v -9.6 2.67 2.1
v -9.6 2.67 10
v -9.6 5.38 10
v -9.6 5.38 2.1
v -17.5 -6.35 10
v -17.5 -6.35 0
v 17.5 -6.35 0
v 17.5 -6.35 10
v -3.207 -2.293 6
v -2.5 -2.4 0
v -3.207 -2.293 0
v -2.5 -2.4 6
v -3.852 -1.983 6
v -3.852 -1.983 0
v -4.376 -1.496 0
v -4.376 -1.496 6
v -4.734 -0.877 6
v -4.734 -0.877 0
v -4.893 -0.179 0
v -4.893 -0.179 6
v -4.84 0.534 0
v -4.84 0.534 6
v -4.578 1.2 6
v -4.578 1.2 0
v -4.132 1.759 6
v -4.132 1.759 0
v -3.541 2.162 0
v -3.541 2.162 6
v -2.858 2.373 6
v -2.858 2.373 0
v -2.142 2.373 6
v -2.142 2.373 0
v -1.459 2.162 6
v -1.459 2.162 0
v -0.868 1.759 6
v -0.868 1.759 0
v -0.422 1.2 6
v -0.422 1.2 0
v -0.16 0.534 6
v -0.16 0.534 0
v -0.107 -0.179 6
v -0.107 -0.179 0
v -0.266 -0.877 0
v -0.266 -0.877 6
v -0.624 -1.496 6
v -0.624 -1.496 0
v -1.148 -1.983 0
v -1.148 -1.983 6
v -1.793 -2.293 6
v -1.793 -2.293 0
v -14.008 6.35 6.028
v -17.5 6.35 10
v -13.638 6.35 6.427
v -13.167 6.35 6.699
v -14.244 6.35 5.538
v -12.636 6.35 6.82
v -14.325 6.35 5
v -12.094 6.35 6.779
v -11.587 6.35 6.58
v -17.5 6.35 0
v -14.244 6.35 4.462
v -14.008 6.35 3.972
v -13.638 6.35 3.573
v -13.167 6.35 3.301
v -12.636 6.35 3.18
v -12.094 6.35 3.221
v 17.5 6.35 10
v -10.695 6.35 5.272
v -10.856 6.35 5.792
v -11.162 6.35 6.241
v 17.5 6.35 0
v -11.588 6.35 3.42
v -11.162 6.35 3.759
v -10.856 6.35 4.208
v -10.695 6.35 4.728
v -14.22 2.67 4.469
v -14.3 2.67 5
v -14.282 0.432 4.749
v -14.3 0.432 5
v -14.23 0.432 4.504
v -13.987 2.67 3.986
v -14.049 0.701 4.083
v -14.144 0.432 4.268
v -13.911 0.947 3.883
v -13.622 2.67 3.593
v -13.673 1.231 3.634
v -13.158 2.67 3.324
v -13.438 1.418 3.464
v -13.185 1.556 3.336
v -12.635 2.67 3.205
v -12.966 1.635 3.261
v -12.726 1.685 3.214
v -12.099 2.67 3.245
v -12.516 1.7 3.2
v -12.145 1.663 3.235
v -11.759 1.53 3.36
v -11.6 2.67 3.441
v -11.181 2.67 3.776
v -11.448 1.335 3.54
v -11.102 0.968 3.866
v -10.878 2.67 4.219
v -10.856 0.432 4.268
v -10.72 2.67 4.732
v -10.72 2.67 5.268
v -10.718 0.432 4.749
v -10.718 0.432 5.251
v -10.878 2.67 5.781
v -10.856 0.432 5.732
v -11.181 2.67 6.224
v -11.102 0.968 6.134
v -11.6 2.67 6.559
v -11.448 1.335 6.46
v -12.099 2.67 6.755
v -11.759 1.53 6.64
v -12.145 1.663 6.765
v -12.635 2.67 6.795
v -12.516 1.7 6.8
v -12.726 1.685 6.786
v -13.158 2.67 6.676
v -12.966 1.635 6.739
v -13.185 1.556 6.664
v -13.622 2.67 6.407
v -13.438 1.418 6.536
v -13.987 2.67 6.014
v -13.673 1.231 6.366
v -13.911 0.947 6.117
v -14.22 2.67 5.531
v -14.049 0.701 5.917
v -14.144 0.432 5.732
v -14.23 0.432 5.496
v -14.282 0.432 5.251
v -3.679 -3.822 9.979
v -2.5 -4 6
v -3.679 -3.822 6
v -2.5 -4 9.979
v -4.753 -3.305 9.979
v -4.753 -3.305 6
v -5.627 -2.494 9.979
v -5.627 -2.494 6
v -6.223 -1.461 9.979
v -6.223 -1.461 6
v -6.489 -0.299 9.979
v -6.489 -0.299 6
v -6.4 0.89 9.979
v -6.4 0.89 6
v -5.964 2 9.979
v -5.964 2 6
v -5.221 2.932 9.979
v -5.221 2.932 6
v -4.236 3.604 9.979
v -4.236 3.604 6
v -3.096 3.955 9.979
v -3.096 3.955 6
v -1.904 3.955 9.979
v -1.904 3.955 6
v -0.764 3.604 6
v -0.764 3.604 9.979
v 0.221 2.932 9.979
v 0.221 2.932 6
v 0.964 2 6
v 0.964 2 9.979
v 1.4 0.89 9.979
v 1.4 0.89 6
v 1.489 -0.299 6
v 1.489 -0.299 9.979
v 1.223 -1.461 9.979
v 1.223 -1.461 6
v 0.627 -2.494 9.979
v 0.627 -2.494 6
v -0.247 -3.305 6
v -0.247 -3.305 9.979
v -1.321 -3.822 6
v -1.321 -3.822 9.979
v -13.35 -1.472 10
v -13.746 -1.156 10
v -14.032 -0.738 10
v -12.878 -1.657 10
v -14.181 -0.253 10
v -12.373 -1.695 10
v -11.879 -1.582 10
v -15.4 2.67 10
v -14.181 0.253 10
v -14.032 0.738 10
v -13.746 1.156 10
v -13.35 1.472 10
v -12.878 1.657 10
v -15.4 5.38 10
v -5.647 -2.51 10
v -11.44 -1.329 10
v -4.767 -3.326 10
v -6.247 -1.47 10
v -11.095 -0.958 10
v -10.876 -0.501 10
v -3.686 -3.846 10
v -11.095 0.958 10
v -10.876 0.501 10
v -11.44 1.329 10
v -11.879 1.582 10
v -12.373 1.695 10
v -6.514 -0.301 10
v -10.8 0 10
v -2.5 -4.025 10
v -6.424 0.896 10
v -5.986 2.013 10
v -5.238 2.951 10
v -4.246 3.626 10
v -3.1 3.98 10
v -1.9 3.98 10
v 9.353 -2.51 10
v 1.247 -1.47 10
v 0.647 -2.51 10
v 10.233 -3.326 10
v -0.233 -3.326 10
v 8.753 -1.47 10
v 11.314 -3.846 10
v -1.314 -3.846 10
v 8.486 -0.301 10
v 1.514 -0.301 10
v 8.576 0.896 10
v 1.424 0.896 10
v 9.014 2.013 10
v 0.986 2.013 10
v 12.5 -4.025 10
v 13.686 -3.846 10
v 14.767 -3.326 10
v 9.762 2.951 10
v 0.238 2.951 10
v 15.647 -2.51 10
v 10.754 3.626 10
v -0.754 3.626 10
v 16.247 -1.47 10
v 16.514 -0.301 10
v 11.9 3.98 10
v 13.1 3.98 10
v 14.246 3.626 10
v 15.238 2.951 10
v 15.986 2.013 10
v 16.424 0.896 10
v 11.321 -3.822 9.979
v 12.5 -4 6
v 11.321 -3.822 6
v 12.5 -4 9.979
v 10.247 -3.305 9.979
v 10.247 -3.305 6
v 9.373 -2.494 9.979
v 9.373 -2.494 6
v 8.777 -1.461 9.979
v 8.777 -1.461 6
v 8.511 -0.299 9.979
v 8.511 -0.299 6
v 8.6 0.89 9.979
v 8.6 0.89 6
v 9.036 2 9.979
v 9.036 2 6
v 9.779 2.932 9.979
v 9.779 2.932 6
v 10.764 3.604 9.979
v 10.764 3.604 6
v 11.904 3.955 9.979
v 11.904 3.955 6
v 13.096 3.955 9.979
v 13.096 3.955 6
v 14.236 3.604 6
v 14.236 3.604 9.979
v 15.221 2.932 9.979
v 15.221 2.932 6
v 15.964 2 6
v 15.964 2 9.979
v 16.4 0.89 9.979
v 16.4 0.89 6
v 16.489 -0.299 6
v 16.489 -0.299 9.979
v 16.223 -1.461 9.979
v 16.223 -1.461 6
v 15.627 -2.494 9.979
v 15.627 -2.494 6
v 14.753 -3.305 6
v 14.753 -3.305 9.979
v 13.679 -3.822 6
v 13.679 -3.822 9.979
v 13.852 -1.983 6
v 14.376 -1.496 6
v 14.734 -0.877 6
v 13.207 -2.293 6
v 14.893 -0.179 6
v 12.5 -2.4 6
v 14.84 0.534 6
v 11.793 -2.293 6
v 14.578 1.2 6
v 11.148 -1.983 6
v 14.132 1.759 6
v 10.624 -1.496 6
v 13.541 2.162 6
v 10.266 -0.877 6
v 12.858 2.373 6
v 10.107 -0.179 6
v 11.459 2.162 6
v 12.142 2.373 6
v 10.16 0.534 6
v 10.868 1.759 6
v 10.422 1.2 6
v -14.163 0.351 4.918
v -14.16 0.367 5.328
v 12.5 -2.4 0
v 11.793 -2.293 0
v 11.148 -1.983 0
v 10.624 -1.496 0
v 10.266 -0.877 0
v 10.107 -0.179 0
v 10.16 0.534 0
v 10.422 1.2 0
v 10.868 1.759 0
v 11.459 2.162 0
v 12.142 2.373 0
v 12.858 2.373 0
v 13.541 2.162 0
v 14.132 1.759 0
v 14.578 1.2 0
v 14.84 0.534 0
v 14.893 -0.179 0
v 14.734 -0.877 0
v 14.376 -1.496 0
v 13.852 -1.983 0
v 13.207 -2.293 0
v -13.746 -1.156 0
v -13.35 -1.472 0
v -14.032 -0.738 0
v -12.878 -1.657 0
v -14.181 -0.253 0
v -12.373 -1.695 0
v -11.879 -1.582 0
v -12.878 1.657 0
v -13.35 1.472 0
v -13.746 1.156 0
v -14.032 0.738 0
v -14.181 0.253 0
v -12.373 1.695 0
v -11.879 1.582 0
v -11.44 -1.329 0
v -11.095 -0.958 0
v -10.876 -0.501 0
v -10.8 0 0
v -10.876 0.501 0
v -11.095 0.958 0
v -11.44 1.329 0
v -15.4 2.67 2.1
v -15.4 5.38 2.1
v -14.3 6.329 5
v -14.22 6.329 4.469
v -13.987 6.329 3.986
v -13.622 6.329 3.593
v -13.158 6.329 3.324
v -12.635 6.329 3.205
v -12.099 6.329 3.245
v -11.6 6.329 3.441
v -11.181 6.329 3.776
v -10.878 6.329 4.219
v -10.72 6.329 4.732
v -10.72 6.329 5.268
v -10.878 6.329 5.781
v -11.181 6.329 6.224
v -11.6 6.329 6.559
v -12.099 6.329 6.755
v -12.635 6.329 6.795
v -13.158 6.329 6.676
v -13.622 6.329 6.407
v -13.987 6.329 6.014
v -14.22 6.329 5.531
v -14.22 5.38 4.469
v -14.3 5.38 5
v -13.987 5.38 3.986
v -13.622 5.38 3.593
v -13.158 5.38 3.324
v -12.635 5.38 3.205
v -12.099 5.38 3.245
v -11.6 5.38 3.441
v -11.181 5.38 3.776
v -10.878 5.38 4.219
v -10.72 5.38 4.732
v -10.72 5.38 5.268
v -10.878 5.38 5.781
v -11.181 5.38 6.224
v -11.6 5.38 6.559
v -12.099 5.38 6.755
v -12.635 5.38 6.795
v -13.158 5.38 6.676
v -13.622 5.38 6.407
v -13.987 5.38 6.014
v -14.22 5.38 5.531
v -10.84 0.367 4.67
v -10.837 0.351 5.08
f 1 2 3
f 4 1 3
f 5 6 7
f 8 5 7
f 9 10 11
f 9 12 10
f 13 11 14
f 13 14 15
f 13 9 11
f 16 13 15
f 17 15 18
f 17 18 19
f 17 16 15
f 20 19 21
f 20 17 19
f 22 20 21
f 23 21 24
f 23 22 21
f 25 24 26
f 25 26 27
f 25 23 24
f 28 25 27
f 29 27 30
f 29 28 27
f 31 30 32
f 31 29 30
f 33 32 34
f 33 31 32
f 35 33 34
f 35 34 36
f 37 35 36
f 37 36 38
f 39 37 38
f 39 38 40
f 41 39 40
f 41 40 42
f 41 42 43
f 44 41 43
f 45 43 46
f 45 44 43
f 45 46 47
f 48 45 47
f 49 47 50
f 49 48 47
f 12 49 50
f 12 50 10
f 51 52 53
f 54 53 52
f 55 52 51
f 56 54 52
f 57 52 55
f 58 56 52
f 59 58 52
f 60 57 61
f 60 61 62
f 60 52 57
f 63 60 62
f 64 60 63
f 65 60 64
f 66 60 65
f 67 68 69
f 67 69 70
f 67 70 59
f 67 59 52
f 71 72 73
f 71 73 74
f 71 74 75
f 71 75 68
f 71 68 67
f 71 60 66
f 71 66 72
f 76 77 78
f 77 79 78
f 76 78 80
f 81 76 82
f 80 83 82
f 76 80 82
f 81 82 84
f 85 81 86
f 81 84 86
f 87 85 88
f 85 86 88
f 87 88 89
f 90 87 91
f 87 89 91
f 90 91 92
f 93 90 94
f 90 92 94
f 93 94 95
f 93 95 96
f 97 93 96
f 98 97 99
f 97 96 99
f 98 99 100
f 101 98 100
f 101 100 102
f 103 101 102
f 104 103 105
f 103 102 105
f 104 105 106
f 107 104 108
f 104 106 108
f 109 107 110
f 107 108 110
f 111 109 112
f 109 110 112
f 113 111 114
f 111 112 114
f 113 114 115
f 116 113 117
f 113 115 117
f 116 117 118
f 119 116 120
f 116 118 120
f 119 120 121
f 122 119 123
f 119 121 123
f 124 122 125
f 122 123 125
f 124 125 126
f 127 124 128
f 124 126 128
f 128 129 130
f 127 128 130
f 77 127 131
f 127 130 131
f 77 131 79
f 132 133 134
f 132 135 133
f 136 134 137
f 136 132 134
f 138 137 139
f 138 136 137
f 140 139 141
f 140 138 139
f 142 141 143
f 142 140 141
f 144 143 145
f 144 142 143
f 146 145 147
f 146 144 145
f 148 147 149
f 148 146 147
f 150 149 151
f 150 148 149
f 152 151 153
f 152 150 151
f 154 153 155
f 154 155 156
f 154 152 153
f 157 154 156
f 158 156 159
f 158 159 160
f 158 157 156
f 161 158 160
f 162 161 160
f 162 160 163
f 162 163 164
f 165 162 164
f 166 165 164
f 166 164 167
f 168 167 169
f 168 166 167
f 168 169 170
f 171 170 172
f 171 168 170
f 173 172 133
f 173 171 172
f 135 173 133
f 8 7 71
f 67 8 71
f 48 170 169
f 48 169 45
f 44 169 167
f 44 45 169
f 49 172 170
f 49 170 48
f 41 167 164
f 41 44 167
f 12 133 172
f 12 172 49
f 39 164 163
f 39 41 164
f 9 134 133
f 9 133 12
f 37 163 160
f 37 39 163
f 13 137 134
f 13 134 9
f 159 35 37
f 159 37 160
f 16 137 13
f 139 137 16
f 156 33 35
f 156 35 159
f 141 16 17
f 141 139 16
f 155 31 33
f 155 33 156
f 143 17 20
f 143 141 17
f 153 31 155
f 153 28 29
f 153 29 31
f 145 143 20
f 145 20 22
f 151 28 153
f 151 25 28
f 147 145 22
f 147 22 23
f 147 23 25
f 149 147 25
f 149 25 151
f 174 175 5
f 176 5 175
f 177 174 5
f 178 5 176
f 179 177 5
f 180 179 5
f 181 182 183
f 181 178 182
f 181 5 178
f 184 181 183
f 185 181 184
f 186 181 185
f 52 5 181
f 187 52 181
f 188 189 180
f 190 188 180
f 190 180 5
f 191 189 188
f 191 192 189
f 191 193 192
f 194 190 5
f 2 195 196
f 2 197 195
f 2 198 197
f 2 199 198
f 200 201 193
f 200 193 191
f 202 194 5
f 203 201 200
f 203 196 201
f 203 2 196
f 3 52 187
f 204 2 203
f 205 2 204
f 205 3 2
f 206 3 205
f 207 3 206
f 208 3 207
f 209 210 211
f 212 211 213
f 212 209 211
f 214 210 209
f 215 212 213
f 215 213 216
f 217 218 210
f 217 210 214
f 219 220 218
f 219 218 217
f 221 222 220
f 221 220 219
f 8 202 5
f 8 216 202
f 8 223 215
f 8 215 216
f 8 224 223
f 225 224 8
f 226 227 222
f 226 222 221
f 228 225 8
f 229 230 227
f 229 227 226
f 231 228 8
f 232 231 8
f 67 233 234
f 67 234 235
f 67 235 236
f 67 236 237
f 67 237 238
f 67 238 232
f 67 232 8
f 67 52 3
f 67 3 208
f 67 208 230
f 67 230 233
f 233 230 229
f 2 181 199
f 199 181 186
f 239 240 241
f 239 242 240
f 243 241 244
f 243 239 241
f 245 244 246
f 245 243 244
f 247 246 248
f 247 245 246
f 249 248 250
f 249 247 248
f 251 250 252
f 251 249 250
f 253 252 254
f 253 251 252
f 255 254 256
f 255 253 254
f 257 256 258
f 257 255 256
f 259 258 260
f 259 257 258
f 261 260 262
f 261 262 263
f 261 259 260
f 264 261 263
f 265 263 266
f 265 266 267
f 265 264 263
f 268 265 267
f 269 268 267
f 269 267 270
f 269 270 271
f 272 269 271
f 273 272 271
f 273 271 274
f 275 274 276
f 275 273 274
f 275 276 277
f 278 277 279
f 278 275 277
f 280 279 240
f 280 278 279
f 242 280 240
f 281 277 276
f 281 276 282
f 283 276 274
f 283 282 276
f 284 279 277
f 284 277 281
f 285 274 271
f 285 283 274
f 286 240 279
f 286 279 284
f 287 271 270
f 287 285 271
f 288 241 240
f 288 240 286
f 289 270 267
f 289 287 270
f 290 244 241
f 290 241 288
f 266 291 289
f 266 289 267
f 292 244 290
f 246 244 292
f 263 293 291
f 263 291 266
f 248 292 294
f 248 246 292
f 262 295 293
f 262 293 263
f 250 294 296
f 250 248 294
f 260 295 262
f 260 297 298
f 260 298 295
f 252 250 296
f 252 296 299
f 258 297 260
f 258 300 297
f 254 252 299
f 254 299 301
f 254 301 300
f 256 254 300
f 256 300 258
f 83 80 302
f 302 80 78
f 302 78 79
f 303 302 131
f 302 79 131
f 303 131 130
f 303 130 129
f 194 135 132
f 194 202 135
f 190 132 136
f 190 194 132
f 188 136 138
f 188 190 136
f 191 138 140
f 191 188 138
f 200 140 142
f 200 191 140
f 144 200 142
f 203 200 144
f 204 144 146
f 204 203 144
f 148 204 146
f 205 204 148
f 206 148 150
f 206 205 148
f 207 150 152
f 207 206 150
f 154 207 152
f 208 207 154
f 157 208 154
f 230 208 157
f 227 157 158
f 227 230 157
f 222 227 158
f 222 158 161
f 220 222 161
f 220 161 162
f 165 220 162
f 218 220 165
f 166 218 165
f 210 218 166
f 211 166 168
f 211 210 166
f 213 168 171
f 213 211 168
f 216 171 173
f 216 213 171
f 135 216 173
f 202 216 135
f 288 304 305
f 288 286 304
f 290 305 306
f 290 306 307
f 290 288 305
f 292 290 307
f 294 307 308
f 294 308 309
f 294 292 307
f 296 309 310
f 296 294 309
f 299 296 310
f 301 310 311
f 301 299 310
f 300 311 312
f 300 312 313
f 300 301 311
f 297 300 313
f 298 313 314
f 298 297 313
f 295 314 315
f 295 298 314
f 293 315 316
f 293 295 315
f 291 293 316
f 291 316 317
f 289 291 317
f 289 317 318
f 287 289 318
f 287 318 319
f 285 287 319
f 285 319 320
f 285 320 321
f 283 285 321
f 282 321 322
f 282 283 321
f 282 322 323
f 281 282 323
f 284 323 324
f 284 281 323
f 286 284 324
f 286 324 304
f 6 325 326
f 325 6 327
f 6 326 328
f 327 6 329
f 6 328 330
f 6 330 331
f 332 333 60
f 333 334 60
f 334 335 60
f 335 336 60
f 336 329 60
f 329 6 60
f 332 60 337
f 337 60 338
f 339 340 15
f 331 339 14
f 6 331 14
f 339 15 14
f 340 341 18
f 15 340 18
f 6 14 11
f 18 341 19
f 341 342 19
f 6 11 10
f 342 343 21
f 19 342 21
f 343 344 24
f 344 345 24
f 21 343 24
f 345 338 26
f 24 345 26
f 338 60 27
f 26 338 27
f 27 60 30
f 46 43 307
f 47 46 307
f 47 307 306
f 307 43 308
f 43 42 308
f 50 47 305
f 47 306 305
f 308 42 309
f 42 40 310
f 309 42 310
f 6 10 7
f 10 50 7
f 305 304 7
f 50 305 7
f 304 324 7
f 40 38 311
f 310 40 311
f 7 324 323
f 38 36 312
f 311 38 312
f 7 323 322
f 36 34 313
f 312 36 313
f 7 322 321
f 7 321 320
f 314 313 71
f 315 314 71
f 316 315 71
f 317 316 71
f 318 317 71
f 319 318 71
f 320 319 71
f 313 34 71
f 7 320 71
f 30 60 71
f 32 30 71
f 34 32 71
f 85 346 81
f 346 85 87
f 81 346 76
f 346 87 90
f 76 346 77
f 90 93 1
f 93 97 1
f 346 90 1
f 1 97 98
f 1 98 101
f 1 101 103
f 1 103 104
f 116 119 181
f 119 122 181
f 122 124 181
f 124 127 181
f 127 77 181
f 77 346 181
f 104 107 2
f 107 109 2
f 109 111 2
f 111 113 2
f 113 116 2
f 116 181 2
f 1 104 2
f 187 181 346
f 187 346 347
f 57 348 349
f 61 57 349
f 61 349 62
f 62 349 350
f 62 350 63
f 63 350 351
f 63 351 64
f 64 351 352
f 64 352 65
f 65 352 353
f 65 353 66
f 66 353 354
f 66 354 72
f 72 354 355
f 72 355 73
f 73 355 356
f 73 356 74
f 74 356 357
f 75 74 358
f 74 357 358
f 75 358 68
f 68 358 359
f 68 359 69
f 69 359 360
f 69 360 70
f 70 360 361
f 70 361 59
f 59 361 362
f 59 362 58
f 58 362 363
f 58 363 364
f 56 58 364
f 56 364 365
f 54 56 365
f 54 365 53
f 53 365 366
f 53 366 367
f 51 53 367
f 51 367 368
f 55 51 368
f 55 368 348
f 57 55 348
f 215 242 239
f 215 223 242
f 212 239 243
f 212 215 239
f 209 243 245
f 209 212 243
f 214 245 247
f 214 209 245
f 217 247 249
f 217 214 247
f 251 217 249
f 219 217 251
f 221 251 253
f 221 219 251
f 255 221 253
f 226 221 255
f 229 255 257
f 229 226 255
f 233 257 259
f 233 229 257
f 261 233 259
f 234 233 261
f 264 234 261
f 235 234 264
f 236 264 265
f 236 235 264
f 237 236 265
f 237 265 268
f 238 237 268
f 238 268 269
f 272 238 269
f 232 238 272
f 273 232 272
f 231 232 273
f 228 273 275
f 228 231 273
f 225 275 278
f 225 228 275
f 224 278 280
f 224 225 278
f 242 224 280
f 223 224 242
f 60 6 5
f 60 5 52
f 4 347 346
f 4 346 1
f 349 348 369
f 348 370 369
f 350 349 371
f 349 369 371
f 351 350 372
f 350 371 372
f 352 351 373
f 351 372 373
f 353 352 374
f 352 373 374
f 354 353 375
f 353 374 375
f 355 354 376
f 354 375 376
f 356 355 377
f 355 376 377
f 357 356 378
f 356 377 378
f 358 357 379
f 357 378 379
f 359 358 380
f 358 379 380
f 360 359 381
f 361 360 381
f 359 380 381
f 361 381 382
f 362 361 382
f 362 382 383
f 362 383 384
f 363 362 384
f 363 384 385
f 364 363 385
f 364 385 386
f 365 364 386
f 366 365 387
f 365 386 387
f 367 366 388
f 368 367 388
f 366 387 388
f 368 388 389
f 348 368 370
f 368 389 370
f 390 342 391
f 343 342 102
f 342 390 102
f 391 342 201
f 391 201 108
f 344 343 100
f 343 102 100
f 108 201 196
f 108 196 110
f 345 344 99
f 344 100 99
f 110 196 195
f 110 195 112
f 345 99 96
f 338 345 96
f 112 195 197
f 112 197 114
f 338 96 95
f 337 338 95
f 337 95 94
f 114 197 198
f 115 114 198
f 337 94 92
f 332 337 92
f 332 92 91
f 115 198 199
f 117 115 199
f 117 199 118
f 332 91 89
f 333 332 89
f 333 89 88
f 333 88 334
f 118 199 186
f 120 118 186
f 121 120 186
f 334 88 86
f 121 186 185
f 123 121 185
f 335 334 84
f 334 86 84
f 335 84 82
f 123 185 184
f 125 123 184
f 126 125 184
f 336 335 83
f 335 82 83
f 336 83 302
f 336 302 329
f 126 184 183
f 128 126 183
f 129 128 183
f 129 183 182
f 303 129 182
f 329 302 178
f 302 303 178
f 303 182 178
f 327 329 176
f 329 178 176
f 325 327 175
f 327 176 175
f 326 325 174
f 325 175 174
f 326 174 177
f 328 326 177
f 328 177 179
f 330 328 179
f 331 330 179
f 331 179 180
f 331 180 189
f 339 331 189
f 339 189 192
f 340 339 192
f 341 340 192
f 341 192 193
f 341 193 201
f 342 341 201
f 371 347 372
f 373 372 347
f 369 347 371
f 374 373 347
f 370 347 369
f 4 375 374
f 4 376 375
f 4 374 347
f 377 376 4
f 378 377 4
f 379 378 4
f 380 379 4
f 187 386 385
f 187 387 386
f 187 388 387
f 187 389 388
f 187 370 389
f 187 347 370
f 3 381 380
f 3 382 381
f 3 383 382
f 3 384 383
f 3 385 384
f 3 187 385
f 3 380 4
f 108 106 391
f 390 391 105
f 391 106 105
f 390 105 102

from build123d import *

# Parameters (mm, degrees)
SKETCH1_W                      = 35
SKETCH1_H                      = 12.7
BOSS_EXTRUDE1_DEPTH            = 10
CBORE_FOR_M4_SHCS1_AT_2_COUNT  = 2
CBORE_FOR_M4_SHCS1_AT_2_PITCH  = 15
SKETCH4_R                      = 1.7
CUT_EXTRUDE1_DEPTH             = 10
M3_CLEARANCE_HOLE1_D           = 3.6
M3_CLEARANCE_HOLE1_DEPTH       = 5.918450886
M3_CLEARANCE_HOLE1_CSINK_D     = 3.65
M3_CLEARANCE_HOLE1_CSINK_ANGLE = 100
M3_CLEARANCE_HOLE1_TIP         = 1.081549114
SKETCH7_W                      = 5.8
SKETCH7_H                      = 2.71
CUT_EXTRUDE2_DEPTH             = 7.9


with BuildPart() as part:
    # Sketch1 → Boss-Extrude1 (new body)
    with BuildSketch(Plane.XY):
        Rectangle(SKETCH1_W, SKETCH1_H)
    extrude(amount=BOSS_EXTRUDE1_DEPTH)

    # Sketch3 → CBORE for M4 SHCS1 (revolve, cut)
    with BuildSketch(Plane(origin=(12.5, 0, 10), x_dir=(0, -1, 0), z_dir=(1, 0, 0))):
        Polygon((0, 0), (0, 10), (2.4, 10), (2.4, 4), (4, 4), (4, 0.020977491), (4.025, 0), align=None)
    cbore_for_m4_shcs1 = revolve(axis=Axis((12.5, 0, 16.35), (0, 0, -1)), mode=Mode.SUBTRACT)

    # CBORE for M4 SHCS1 at 2: CBORE for M4 SHCS1 ×2
    with Locations(*[(-i * CBORE_FOR_M4_SHCS1_AT_2_PITCH, 0, 0) for i in range(1, CBORE_FOR_M4_SHCS1_AT_2_COUNT)]):
        add(cbore_for_m4_shcs1, mode=Mode.SUBTRACT)

    # Sketch4 → Cut-Extrude1 (cut)
    with BuildSketch(Plane.XY.offset(10)):
        with Locations((-12.5, 0)):
            Circle(SKETCH4_R)
    extrude(amount=-CUT_EXTRUDE1_DEPTH, mode=Mode.SUBTRACT)

    # M3 Clearance Hole1
    with Locations(Plane(origin=(0, 6.35, 0), x_dir=(1, 0, 0), z_dir=(0, 1, 0))):
        with Locations((-12.5, -5)):
            CounterSinkHole(M3_CLEARANCE_HOLE1_D / 2, M3_CLEARANCE_HOLE1_CSINK_D / 2, depth=M3_CLEARANCE_HOLE1_DEPTH, counter_sink_angle=M3_CLEARANCE_HOLE1_CSINK_ANGLE)
            with Locations((0, 0, -(M3_CLEARANCE_HOLE1_DEPTH + M3_CLEARANCE_HOLE1_TIP / 2))):  # 118° drill point
                Cone(0, M3_CLEARANCE_HOLE1_D / 2, M3_CLEARANCE_HOLE1_TIP, mode=Mode.SUBTRACT)

    # Sketch7 → Cut-Extrude2 (cut)
    with BuildSketch(Plane.XY.offset(10)):
        with Locations((-12.5, 4.025)):
            Rectangle(SKETCH7_W, SKETCH7_H)
    extrude(amount=-CUT_EXTRUDE2_DEPTH, mode=Mode.SUBTRACT)


solid = part.part
